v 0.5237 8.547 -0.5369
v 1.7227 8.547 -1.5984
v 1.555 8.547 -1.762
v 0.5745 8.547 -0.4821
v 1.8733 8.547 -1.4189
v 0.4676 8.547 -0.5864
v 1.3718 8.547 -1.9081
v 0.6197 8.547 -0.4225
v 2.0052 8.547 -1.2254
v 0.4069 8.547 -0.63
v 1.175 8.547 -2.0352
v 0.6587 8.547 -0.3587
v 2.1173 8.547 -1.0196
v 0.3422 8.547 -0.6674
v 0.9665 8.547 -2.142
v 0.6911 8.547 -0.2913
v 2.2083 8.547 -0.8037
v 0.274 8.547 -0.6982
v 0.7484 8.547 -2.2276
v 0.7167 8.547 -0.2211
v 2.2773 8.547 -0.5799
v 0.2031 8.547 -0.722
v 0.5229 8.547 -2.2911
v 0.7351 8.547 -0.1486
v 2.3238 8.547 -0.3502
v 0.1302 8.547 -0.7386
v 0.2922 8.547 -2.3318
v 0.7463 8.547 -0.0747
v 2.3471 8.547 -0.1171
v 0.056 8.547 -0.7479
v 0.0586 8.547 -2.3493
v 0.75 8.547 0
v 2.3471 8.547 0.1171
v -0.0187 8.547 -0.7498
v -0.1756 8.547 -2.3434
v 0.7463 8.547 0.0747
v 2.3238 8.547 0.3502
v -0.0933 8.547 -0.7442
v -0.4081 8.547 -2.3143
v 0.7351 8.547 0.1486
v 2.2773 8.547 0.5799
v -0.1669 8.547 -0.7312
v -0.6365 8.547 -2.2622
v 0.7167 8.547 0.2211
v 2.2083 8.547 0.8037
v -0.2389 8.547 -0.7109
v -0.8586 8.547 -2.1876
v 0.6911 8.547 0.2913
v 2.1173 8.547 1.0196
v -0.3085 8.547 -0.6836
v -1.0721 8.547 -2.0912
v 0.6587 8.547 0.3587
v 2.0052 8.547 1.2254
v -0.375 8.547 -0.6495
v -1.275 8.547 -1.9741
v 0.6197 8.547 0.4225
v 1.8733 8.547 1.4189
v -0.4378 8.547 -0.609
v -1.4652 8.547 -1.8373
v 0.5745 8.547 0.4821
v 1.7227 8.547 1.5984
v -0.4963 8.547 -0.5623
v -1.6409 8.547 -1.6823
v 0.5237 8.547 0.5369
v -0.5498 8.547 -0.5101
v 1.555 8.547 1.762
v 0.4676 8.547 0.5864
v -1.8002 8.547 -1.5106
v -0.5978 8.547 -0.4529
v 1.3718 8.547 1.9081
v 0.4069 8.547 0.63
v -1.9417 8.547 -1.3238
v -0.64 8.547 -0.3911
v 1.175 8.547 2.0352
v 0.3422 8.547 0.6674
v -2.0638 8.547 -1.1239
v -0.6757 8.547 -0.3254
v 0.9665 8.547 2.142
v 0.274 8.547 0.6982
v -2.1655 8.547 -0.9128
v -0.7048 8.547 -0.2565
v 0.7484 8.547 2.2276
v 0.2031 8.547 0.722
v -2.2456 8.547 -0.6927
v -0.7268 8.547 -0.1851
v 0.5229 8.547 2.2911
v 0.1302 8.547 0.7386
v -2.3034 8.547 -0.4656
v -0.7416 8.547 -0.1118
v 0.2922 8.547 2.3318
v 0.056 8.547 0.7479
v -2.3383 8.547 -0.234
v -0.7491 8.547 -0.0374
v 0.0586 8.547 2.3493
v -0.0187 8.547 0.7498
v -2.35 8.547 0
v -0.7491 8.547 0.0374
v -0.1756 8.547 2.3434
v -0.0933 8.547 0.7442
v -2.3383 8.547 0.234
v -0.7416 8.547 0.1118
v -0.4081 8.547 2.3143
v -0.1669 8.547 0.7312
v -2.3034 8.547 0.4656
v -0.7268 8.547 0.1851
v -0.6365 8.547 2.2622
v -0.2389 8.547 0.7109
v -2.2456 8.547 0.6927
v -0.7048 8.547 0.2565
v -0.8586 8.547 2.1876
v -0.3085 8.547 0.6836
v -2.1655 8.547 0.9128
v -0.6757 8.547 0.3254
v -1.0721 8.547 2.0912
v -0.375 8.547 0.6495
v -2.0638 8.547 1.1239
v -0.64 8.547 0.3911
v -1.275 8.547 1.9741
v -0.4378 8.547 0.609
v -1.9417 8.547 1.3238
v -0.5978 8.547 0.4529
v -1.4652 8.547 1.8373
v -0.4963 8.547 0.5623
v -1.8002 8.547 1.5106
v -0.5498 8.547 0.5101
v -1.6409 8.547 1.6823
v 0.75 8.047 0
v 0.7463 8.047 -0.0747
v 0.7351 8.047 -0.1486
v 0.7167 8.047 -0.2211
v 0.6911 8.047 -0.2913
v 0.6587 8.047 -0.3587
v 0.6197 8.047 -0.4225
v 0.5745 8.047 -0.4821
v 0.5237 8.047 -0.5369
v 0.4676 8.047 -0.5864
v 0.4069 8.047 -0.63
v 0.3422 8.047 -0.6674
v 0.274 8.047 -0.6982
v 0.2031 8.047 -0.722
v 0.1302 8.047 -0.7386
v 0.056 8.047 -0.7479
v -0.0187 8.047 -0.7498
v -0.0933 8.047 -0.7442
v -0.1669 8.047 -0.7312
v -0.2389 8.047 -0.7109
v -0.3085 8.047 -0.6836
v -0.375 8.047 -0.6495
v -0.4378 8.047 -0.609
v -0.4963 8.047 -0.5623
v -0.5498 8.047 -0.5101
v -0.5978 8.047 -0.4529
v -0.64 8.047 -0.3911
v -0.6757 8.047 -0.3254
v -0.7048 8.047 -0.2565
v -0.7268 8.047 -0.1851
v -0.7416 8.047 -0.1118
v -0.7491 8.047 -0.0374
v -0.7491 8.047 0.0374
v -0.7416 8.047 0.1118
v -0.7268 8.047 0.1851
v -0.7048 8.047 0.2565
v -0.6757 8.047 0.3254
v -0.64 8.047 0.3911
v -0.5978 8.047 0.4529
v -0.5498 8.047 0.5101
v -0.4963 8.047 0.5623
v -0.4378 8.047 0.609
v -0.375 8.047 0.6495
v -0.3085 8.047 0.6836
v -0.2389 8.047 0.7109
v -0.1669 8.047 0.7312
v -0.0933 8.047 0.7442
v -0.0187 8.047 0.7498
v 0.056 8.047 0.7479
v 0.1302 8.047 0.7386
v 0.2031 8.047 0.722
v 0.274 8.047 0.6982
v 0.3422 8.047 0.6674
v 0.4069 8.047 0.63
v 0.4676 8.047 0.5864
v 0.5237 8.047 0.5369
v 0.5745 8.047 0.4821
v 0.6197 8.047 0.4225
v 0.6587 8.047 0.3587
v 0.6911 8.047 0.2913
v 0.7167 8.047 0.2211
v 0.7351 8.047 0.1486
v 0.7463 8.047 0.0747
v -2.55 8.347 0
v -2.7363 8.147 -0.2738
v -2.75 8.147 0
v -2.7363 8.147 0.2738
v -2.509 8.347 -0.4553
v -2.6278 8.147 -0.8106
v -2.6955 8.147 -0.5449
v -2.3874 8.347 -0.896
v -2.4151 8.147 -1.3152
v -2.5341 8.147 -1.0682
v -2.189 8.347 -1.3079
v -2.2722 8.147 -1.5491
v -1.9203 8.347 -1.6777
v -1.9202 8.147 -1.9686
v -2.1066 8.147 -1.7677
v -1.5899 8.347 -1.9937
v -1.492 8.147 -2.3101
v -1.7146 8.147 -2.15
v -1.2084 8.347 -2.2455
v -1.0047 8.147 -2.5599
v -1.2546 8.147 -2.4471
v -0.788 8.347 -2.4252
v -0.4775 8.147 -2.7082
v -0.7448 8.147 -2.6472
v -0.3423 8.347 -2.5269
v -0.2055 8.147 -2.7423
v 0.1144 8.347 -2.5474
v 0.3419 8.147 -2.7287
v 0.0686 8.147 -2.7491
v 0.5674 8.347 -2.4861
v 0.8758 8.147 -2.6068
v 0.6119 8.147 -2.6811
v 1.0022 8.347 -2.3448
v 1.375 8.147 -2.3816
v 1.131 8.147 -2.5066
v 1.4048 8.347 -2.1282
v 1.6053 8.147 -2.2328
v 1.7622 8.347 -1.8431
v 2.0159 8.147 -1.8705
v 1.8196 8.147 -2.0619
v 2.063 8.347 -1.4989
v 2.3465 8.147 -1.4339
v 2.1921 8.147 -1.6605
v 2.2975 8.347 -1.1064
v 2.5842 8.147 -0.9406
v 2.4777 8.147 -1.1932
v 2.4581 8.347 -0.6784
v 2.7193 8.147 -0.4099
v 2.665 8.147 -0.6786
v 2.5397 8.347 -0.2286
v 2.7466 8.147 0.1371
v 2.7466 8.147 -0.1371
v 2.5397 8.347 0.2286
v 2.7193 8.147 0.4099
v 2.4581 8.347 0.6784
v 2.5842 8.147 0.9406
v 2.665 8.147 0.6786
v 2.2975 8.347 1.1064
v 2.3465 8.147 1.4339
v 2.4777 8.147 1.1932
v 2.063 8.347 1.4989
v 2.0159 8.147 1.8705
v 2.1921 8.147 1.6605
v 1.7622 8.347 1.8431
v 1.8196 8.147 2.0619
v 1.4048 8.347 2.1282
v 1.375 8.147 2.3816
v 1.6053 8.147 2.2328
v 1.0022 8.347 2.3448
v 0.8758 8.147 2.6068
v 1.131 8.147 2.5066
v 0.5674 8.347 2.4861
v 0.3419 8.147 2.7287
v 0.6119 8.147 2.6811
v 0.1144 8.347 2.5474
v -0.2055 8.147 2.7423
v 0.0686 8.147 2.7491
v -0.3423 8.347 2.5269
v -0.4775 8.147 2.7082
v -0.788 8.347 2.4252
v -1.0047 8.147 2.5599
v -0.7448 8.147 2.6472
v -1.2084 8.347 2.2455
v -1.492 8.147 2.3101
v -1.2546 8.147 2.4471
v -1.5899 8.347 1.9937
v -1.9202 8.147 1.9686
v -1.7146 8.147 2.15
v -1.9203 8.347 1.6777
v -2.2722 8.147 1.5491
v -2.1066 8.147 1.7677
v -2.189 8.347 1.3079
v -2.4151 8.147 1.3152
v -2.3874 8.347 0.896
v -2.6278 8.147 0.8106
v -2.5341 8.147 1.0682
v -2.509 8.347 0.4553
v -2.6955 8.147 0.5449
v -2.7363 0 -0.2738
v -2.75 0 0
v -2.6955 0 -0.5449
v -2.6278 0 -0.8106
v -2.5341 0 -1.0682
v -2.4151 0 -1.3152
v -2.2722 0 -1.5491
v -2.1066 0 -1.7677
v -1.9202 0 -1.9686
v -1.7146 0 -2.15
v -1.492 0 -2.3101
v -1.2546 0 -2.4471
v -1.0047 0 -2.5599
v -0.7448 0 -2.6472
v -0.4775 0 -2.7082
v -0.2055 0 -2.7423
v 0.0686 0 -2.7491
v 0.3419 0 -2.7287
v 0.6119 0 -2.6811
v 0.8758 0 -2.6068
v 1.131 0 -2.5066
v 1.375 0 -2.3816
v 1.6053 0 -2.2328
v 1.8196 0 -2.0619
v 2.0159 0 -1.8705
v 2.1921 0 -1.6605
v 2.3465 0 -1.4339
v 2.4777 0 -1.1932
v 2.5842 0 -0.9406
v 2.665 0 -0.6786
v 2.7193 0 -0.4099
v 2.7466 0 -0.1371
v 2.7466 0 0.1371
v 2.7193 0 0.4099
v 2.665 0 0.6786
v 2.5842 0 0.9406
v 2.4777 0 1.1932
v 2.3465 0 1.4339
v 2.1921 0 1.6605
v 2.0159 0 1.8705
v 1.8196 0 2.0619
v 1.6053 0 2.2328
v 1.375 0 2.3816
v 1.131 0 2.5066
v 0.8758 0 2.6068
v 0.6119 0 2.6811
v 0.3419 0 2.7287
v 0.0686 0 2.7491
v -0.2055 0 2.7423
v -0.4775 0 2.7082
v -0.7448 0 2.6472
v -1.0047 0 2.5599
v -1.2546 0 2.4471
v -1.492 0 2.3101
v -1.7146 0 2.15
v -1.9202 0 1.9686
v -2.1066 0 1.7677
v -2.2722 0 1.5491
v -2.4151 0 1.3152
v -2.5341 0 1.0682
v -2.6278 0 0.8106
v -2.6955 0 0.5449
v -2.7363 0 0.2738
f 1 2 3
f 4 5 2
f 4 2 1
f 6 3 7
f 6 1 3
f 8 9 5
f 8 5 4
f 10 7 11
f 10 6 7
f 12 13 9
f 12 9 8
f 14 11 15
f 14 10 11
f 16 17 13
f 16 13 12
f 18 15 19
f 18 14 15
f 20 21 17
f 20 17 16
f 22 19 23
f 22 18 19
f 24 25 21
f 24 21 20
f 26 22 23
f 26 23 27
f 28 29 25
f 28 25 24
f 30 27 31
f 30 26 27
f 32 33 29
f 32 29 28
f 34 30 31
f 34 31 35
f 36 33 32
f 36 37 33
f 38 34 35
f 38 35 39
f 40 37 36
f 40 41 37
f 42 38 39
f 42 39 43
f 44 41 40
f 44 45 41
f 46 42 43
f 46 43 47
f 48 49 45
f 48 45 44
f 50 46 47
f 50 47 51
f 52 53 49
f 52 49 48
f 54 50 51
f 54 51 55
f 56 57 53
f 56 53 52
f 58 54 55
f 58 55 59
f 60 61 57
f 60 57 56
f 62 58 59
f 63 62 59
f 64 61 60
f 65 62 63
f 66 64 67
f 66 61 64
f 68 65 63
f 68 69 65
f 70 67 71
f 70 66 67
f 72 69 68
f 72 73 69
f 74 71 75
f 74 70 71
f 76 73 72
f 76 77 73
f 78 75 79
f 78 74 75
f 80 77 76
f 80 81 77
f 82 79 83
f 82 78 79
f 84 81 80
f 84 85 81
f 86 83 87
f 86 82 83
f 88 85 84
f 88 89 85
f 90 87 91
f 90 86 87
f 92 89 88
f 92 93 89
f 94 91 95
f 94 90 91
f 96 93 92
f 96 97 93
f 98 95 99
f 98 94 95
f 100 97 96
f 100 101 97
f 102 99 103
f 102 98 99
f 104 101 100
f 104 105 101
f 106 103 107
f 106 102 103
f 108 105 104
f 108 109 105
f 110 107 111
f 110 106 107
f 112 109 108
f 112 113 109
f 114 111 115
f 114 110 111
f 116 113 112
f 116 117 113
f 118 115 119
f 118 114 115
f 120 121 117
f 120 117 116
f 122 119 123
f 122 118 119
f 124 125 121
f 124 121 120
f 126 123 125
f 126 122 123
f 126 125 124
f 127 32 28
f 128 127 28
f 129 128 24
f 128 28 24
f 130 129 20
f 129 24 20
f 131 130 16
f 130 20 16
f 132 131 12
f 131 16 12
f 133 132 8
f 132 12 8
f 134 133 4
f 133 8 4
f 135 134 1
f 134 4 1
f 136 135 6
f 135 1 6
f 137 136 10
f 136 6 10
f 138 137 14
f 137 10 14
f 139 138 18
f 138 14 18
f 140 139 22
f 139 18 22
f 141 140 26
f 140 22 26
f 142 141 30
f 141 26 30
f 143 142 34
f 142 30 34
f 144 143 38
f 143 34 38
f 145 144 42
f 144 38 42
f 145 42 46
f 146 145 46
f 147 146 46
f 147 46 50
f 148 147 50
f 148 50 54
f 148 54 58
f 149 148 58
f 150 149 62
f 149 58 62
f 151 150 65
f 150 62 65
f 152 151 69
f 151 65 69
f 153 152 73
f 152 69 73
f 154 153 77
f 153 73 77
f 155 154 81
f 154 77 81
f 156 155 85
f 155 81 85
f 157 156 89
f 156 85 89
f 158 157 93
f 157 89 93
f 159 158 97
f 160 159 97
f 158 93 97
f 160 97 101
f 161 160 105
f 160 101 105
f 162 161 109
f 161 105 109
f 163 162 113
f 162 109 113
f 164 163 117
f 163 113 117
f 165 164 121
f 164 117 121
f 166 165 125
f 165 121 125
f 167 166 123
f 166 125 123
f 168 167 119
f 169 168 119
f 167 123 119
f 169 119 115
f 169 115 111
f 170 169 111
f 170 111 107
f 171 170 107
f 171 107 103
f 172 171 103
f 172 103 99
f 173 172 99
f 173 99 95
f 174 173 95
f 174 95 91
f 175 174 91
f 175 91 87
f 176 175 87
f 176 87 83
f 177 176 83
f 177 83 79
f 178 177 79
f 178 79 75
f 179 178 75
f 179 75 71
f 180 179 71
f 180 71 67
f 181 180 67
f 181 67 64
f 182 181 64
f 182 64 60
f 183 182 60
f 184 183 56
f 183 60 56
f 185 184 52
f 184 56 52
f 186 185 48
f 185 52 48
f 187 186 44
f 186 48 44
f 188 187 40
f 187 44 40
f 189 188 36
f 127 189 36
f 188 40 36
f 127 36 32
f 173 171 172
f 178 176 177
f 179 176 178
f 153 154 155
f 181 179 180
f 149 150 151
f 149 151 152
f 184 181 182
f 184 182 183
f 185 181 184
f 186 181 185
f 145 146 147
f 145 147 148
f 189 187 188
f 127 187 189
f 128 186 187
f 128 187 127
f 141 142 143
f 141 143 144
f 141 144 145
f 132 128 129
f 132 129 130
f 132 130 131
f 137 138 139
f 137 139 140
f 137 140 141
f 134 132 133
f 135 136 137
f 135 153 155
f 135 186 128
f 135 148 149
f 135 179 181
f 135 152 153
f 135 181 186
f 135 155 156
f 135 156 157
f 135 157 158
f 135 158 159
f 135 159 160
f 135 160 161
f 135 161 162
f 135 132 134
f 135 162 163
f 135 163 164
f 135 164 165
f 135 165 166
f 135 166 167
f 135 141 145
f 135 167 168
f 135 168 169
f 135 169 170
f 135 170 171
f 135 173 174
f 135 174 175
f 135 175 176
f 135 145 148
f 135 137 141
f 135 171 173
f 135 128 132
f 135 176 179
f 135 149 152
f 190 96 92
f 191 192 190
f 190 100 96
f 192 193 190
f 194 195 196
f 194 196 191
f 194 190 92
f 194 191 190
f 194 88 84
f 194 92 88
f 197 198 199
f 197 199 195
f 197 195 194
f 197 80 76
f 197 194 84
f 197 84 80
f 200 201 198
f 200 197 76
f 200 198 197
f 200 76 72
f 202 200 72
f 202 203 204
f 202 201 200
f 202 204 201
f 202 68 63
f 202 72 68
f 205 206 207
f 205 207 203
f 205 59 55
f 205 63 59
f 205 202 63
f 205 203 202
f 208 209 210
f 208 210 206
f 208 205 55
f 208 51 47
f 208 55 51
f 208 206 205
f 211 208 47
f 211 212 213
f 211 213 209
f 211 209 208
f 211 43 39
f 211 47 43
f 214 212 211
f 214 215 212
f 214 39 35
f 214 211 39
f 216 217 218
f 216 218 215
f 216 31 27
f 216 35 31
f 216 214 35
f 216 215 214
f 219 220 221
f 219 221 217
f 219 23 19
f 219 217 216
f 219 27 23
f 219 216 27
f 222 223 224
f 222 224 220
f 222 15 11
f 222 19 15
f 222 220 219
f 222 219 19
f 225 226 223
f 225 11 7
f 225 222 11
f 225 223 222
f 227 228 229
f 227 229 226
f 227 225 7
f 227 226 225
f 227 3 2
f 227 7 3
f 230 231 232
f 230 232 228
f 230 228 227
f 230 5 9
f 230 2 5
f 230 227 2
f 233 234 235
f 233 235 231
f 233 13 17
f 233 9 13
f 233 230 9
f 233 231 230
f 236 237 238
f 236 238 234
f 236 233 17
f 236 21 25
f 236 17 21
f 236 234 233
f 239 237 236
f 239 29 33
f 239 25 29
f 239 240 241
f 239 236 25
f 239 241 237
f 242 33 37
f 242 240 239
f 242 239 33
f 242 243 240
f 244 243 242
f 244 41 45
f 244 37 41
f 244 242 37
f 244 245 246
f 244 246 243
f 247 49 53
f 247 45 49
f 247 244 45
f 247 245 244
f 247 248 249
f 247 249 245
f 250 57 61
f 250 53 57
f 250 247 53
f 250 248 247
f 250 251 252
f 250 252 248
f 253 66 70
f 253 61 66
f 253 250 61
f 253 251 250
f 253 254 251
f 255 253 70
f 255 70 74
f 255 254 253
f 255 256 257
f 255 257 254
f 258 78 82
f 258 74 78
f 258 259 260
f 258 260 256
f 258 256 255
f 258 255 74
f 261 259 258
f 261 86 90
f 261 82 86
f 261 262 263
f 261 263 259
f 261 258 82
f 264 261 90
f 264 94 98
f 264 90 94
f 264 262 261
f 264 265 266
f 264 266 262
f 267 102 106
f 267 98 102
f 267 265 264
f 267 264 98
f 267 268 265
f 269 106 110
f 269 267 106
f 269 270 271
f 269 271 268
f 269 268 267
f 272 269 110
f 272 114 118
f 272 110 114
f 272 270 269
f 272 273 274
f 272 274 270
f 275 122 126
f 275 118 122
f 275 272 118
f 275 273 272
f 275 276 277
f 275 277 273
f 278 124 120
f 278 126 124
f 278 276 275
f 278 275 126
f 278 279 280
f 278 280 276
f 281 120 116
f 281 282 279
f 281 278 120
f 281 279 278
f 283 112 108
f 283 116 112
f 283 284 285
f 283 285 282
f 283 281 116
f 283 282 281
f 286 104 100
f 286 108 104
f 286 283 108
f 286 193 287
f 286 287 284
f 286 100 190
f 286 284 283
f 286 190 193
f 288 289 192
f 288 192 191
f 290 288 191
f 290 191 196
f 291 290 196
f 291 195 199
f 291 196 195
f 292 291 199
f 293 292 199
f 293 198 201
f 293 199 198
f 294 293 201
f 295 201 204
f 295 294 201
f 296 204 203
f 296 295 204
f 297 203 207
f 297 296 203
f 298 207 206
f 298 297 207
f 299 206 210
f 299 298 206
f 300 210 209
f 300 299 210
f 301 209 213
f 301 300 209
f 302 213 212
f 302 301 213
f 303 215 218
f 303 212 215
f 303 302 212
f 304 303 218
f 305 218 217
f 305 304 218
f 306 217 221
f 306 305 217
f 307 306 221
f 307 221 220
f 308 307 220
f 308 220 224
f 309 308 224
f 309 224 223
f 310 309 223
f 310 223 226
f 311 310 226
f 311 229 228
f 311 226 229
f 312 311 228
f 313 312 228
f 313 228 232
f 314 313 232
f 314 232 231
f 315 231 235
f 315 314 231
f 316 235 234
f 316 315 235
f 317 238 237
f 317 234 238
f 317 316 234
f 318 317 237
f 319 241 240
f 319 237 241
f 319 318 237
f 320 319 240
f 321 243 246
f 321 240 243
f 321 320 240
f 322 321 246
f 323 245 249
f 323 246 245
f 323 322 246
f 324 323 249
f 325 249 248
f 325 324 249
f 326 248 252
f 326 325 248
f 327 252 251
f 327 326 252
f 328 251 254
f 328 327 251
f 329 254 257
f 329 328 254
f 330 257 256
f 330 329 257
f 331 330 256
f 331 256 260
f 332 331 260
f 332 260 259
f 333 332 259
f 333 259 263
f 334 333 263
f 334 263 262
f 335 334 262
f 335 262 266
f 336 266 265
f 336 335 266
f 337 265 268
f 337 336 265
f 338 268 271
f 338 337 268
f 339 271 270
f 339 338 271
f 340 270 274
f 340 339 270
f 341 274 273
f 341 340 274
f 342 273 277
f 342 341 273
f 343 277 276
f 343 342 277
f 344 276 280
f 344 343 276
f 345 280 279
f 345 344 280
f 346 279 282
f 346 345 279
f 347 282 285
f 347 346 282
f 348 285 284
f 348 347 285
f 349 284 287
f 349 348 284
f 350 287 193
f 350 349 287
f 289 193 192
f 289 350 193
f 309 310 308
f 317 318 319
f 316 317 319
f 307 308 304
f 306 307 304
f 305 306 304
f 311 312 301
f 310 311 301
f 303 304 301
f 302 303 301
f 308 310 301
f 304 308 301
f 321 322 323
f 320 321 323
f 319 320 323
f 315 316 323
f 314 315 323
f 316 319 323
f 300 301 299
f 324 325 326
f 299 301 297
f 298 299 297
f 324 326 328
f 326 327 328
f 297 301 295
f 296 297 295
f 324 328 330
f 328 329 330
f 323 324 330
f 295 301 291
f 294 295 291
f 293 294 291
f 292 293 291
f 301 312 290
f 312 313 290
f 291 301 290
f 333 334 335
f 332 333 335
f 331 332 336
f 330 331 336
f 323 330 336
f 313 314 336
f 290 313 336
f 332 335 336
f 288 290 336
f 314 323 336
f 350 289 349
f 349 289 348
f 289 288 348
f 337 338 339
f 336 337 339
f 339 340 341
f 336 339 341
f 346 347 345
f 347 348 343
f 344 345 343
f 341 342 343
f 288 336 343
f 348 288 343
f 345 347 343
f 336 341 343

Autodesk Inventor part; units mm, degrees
ref_plane "YZ Plane" through (0, 0, 0) normal (1, 0, 0) x (0, 1, 0)
ref_plane "XZ Plane" through (0, 0, 0) normal (0, 1, 0) x (-1, 0, 0)
ref_plane "XY Plane" through (0, 0, 0) normal (0, 0, 1) x (1, 0, 0)
sketch "Sketch1" plane through (0, 0, 0) normal (0, 1, 0) x (-1, 0, 0)
  circle A0 centre (0, 0) radius 2.75
  dimension "d0" = 5.5
extrude "Extrusion1" add sketch "Sketch1" along normal blind 8.547
chamfer "Chamfer1" distance 0.4 angle 45 1 edges at (2.75, 8.547, 0)
sketch "Sketch2" plane through (0, 8.547, 0) normal (0, 1, 0) x (1, 0, 0)
  circle A0 centre (0, 0) radius 2.35 projected
  circle A1 centre (0, 0) radius 0.75
  dimension "d6" = 1.5
extrude "Extrusion2" cut sketch "Sketch2" against normal blind 0.5 contours A1
properties part number "main_lcd_push_button" material "ABS Plastic"
